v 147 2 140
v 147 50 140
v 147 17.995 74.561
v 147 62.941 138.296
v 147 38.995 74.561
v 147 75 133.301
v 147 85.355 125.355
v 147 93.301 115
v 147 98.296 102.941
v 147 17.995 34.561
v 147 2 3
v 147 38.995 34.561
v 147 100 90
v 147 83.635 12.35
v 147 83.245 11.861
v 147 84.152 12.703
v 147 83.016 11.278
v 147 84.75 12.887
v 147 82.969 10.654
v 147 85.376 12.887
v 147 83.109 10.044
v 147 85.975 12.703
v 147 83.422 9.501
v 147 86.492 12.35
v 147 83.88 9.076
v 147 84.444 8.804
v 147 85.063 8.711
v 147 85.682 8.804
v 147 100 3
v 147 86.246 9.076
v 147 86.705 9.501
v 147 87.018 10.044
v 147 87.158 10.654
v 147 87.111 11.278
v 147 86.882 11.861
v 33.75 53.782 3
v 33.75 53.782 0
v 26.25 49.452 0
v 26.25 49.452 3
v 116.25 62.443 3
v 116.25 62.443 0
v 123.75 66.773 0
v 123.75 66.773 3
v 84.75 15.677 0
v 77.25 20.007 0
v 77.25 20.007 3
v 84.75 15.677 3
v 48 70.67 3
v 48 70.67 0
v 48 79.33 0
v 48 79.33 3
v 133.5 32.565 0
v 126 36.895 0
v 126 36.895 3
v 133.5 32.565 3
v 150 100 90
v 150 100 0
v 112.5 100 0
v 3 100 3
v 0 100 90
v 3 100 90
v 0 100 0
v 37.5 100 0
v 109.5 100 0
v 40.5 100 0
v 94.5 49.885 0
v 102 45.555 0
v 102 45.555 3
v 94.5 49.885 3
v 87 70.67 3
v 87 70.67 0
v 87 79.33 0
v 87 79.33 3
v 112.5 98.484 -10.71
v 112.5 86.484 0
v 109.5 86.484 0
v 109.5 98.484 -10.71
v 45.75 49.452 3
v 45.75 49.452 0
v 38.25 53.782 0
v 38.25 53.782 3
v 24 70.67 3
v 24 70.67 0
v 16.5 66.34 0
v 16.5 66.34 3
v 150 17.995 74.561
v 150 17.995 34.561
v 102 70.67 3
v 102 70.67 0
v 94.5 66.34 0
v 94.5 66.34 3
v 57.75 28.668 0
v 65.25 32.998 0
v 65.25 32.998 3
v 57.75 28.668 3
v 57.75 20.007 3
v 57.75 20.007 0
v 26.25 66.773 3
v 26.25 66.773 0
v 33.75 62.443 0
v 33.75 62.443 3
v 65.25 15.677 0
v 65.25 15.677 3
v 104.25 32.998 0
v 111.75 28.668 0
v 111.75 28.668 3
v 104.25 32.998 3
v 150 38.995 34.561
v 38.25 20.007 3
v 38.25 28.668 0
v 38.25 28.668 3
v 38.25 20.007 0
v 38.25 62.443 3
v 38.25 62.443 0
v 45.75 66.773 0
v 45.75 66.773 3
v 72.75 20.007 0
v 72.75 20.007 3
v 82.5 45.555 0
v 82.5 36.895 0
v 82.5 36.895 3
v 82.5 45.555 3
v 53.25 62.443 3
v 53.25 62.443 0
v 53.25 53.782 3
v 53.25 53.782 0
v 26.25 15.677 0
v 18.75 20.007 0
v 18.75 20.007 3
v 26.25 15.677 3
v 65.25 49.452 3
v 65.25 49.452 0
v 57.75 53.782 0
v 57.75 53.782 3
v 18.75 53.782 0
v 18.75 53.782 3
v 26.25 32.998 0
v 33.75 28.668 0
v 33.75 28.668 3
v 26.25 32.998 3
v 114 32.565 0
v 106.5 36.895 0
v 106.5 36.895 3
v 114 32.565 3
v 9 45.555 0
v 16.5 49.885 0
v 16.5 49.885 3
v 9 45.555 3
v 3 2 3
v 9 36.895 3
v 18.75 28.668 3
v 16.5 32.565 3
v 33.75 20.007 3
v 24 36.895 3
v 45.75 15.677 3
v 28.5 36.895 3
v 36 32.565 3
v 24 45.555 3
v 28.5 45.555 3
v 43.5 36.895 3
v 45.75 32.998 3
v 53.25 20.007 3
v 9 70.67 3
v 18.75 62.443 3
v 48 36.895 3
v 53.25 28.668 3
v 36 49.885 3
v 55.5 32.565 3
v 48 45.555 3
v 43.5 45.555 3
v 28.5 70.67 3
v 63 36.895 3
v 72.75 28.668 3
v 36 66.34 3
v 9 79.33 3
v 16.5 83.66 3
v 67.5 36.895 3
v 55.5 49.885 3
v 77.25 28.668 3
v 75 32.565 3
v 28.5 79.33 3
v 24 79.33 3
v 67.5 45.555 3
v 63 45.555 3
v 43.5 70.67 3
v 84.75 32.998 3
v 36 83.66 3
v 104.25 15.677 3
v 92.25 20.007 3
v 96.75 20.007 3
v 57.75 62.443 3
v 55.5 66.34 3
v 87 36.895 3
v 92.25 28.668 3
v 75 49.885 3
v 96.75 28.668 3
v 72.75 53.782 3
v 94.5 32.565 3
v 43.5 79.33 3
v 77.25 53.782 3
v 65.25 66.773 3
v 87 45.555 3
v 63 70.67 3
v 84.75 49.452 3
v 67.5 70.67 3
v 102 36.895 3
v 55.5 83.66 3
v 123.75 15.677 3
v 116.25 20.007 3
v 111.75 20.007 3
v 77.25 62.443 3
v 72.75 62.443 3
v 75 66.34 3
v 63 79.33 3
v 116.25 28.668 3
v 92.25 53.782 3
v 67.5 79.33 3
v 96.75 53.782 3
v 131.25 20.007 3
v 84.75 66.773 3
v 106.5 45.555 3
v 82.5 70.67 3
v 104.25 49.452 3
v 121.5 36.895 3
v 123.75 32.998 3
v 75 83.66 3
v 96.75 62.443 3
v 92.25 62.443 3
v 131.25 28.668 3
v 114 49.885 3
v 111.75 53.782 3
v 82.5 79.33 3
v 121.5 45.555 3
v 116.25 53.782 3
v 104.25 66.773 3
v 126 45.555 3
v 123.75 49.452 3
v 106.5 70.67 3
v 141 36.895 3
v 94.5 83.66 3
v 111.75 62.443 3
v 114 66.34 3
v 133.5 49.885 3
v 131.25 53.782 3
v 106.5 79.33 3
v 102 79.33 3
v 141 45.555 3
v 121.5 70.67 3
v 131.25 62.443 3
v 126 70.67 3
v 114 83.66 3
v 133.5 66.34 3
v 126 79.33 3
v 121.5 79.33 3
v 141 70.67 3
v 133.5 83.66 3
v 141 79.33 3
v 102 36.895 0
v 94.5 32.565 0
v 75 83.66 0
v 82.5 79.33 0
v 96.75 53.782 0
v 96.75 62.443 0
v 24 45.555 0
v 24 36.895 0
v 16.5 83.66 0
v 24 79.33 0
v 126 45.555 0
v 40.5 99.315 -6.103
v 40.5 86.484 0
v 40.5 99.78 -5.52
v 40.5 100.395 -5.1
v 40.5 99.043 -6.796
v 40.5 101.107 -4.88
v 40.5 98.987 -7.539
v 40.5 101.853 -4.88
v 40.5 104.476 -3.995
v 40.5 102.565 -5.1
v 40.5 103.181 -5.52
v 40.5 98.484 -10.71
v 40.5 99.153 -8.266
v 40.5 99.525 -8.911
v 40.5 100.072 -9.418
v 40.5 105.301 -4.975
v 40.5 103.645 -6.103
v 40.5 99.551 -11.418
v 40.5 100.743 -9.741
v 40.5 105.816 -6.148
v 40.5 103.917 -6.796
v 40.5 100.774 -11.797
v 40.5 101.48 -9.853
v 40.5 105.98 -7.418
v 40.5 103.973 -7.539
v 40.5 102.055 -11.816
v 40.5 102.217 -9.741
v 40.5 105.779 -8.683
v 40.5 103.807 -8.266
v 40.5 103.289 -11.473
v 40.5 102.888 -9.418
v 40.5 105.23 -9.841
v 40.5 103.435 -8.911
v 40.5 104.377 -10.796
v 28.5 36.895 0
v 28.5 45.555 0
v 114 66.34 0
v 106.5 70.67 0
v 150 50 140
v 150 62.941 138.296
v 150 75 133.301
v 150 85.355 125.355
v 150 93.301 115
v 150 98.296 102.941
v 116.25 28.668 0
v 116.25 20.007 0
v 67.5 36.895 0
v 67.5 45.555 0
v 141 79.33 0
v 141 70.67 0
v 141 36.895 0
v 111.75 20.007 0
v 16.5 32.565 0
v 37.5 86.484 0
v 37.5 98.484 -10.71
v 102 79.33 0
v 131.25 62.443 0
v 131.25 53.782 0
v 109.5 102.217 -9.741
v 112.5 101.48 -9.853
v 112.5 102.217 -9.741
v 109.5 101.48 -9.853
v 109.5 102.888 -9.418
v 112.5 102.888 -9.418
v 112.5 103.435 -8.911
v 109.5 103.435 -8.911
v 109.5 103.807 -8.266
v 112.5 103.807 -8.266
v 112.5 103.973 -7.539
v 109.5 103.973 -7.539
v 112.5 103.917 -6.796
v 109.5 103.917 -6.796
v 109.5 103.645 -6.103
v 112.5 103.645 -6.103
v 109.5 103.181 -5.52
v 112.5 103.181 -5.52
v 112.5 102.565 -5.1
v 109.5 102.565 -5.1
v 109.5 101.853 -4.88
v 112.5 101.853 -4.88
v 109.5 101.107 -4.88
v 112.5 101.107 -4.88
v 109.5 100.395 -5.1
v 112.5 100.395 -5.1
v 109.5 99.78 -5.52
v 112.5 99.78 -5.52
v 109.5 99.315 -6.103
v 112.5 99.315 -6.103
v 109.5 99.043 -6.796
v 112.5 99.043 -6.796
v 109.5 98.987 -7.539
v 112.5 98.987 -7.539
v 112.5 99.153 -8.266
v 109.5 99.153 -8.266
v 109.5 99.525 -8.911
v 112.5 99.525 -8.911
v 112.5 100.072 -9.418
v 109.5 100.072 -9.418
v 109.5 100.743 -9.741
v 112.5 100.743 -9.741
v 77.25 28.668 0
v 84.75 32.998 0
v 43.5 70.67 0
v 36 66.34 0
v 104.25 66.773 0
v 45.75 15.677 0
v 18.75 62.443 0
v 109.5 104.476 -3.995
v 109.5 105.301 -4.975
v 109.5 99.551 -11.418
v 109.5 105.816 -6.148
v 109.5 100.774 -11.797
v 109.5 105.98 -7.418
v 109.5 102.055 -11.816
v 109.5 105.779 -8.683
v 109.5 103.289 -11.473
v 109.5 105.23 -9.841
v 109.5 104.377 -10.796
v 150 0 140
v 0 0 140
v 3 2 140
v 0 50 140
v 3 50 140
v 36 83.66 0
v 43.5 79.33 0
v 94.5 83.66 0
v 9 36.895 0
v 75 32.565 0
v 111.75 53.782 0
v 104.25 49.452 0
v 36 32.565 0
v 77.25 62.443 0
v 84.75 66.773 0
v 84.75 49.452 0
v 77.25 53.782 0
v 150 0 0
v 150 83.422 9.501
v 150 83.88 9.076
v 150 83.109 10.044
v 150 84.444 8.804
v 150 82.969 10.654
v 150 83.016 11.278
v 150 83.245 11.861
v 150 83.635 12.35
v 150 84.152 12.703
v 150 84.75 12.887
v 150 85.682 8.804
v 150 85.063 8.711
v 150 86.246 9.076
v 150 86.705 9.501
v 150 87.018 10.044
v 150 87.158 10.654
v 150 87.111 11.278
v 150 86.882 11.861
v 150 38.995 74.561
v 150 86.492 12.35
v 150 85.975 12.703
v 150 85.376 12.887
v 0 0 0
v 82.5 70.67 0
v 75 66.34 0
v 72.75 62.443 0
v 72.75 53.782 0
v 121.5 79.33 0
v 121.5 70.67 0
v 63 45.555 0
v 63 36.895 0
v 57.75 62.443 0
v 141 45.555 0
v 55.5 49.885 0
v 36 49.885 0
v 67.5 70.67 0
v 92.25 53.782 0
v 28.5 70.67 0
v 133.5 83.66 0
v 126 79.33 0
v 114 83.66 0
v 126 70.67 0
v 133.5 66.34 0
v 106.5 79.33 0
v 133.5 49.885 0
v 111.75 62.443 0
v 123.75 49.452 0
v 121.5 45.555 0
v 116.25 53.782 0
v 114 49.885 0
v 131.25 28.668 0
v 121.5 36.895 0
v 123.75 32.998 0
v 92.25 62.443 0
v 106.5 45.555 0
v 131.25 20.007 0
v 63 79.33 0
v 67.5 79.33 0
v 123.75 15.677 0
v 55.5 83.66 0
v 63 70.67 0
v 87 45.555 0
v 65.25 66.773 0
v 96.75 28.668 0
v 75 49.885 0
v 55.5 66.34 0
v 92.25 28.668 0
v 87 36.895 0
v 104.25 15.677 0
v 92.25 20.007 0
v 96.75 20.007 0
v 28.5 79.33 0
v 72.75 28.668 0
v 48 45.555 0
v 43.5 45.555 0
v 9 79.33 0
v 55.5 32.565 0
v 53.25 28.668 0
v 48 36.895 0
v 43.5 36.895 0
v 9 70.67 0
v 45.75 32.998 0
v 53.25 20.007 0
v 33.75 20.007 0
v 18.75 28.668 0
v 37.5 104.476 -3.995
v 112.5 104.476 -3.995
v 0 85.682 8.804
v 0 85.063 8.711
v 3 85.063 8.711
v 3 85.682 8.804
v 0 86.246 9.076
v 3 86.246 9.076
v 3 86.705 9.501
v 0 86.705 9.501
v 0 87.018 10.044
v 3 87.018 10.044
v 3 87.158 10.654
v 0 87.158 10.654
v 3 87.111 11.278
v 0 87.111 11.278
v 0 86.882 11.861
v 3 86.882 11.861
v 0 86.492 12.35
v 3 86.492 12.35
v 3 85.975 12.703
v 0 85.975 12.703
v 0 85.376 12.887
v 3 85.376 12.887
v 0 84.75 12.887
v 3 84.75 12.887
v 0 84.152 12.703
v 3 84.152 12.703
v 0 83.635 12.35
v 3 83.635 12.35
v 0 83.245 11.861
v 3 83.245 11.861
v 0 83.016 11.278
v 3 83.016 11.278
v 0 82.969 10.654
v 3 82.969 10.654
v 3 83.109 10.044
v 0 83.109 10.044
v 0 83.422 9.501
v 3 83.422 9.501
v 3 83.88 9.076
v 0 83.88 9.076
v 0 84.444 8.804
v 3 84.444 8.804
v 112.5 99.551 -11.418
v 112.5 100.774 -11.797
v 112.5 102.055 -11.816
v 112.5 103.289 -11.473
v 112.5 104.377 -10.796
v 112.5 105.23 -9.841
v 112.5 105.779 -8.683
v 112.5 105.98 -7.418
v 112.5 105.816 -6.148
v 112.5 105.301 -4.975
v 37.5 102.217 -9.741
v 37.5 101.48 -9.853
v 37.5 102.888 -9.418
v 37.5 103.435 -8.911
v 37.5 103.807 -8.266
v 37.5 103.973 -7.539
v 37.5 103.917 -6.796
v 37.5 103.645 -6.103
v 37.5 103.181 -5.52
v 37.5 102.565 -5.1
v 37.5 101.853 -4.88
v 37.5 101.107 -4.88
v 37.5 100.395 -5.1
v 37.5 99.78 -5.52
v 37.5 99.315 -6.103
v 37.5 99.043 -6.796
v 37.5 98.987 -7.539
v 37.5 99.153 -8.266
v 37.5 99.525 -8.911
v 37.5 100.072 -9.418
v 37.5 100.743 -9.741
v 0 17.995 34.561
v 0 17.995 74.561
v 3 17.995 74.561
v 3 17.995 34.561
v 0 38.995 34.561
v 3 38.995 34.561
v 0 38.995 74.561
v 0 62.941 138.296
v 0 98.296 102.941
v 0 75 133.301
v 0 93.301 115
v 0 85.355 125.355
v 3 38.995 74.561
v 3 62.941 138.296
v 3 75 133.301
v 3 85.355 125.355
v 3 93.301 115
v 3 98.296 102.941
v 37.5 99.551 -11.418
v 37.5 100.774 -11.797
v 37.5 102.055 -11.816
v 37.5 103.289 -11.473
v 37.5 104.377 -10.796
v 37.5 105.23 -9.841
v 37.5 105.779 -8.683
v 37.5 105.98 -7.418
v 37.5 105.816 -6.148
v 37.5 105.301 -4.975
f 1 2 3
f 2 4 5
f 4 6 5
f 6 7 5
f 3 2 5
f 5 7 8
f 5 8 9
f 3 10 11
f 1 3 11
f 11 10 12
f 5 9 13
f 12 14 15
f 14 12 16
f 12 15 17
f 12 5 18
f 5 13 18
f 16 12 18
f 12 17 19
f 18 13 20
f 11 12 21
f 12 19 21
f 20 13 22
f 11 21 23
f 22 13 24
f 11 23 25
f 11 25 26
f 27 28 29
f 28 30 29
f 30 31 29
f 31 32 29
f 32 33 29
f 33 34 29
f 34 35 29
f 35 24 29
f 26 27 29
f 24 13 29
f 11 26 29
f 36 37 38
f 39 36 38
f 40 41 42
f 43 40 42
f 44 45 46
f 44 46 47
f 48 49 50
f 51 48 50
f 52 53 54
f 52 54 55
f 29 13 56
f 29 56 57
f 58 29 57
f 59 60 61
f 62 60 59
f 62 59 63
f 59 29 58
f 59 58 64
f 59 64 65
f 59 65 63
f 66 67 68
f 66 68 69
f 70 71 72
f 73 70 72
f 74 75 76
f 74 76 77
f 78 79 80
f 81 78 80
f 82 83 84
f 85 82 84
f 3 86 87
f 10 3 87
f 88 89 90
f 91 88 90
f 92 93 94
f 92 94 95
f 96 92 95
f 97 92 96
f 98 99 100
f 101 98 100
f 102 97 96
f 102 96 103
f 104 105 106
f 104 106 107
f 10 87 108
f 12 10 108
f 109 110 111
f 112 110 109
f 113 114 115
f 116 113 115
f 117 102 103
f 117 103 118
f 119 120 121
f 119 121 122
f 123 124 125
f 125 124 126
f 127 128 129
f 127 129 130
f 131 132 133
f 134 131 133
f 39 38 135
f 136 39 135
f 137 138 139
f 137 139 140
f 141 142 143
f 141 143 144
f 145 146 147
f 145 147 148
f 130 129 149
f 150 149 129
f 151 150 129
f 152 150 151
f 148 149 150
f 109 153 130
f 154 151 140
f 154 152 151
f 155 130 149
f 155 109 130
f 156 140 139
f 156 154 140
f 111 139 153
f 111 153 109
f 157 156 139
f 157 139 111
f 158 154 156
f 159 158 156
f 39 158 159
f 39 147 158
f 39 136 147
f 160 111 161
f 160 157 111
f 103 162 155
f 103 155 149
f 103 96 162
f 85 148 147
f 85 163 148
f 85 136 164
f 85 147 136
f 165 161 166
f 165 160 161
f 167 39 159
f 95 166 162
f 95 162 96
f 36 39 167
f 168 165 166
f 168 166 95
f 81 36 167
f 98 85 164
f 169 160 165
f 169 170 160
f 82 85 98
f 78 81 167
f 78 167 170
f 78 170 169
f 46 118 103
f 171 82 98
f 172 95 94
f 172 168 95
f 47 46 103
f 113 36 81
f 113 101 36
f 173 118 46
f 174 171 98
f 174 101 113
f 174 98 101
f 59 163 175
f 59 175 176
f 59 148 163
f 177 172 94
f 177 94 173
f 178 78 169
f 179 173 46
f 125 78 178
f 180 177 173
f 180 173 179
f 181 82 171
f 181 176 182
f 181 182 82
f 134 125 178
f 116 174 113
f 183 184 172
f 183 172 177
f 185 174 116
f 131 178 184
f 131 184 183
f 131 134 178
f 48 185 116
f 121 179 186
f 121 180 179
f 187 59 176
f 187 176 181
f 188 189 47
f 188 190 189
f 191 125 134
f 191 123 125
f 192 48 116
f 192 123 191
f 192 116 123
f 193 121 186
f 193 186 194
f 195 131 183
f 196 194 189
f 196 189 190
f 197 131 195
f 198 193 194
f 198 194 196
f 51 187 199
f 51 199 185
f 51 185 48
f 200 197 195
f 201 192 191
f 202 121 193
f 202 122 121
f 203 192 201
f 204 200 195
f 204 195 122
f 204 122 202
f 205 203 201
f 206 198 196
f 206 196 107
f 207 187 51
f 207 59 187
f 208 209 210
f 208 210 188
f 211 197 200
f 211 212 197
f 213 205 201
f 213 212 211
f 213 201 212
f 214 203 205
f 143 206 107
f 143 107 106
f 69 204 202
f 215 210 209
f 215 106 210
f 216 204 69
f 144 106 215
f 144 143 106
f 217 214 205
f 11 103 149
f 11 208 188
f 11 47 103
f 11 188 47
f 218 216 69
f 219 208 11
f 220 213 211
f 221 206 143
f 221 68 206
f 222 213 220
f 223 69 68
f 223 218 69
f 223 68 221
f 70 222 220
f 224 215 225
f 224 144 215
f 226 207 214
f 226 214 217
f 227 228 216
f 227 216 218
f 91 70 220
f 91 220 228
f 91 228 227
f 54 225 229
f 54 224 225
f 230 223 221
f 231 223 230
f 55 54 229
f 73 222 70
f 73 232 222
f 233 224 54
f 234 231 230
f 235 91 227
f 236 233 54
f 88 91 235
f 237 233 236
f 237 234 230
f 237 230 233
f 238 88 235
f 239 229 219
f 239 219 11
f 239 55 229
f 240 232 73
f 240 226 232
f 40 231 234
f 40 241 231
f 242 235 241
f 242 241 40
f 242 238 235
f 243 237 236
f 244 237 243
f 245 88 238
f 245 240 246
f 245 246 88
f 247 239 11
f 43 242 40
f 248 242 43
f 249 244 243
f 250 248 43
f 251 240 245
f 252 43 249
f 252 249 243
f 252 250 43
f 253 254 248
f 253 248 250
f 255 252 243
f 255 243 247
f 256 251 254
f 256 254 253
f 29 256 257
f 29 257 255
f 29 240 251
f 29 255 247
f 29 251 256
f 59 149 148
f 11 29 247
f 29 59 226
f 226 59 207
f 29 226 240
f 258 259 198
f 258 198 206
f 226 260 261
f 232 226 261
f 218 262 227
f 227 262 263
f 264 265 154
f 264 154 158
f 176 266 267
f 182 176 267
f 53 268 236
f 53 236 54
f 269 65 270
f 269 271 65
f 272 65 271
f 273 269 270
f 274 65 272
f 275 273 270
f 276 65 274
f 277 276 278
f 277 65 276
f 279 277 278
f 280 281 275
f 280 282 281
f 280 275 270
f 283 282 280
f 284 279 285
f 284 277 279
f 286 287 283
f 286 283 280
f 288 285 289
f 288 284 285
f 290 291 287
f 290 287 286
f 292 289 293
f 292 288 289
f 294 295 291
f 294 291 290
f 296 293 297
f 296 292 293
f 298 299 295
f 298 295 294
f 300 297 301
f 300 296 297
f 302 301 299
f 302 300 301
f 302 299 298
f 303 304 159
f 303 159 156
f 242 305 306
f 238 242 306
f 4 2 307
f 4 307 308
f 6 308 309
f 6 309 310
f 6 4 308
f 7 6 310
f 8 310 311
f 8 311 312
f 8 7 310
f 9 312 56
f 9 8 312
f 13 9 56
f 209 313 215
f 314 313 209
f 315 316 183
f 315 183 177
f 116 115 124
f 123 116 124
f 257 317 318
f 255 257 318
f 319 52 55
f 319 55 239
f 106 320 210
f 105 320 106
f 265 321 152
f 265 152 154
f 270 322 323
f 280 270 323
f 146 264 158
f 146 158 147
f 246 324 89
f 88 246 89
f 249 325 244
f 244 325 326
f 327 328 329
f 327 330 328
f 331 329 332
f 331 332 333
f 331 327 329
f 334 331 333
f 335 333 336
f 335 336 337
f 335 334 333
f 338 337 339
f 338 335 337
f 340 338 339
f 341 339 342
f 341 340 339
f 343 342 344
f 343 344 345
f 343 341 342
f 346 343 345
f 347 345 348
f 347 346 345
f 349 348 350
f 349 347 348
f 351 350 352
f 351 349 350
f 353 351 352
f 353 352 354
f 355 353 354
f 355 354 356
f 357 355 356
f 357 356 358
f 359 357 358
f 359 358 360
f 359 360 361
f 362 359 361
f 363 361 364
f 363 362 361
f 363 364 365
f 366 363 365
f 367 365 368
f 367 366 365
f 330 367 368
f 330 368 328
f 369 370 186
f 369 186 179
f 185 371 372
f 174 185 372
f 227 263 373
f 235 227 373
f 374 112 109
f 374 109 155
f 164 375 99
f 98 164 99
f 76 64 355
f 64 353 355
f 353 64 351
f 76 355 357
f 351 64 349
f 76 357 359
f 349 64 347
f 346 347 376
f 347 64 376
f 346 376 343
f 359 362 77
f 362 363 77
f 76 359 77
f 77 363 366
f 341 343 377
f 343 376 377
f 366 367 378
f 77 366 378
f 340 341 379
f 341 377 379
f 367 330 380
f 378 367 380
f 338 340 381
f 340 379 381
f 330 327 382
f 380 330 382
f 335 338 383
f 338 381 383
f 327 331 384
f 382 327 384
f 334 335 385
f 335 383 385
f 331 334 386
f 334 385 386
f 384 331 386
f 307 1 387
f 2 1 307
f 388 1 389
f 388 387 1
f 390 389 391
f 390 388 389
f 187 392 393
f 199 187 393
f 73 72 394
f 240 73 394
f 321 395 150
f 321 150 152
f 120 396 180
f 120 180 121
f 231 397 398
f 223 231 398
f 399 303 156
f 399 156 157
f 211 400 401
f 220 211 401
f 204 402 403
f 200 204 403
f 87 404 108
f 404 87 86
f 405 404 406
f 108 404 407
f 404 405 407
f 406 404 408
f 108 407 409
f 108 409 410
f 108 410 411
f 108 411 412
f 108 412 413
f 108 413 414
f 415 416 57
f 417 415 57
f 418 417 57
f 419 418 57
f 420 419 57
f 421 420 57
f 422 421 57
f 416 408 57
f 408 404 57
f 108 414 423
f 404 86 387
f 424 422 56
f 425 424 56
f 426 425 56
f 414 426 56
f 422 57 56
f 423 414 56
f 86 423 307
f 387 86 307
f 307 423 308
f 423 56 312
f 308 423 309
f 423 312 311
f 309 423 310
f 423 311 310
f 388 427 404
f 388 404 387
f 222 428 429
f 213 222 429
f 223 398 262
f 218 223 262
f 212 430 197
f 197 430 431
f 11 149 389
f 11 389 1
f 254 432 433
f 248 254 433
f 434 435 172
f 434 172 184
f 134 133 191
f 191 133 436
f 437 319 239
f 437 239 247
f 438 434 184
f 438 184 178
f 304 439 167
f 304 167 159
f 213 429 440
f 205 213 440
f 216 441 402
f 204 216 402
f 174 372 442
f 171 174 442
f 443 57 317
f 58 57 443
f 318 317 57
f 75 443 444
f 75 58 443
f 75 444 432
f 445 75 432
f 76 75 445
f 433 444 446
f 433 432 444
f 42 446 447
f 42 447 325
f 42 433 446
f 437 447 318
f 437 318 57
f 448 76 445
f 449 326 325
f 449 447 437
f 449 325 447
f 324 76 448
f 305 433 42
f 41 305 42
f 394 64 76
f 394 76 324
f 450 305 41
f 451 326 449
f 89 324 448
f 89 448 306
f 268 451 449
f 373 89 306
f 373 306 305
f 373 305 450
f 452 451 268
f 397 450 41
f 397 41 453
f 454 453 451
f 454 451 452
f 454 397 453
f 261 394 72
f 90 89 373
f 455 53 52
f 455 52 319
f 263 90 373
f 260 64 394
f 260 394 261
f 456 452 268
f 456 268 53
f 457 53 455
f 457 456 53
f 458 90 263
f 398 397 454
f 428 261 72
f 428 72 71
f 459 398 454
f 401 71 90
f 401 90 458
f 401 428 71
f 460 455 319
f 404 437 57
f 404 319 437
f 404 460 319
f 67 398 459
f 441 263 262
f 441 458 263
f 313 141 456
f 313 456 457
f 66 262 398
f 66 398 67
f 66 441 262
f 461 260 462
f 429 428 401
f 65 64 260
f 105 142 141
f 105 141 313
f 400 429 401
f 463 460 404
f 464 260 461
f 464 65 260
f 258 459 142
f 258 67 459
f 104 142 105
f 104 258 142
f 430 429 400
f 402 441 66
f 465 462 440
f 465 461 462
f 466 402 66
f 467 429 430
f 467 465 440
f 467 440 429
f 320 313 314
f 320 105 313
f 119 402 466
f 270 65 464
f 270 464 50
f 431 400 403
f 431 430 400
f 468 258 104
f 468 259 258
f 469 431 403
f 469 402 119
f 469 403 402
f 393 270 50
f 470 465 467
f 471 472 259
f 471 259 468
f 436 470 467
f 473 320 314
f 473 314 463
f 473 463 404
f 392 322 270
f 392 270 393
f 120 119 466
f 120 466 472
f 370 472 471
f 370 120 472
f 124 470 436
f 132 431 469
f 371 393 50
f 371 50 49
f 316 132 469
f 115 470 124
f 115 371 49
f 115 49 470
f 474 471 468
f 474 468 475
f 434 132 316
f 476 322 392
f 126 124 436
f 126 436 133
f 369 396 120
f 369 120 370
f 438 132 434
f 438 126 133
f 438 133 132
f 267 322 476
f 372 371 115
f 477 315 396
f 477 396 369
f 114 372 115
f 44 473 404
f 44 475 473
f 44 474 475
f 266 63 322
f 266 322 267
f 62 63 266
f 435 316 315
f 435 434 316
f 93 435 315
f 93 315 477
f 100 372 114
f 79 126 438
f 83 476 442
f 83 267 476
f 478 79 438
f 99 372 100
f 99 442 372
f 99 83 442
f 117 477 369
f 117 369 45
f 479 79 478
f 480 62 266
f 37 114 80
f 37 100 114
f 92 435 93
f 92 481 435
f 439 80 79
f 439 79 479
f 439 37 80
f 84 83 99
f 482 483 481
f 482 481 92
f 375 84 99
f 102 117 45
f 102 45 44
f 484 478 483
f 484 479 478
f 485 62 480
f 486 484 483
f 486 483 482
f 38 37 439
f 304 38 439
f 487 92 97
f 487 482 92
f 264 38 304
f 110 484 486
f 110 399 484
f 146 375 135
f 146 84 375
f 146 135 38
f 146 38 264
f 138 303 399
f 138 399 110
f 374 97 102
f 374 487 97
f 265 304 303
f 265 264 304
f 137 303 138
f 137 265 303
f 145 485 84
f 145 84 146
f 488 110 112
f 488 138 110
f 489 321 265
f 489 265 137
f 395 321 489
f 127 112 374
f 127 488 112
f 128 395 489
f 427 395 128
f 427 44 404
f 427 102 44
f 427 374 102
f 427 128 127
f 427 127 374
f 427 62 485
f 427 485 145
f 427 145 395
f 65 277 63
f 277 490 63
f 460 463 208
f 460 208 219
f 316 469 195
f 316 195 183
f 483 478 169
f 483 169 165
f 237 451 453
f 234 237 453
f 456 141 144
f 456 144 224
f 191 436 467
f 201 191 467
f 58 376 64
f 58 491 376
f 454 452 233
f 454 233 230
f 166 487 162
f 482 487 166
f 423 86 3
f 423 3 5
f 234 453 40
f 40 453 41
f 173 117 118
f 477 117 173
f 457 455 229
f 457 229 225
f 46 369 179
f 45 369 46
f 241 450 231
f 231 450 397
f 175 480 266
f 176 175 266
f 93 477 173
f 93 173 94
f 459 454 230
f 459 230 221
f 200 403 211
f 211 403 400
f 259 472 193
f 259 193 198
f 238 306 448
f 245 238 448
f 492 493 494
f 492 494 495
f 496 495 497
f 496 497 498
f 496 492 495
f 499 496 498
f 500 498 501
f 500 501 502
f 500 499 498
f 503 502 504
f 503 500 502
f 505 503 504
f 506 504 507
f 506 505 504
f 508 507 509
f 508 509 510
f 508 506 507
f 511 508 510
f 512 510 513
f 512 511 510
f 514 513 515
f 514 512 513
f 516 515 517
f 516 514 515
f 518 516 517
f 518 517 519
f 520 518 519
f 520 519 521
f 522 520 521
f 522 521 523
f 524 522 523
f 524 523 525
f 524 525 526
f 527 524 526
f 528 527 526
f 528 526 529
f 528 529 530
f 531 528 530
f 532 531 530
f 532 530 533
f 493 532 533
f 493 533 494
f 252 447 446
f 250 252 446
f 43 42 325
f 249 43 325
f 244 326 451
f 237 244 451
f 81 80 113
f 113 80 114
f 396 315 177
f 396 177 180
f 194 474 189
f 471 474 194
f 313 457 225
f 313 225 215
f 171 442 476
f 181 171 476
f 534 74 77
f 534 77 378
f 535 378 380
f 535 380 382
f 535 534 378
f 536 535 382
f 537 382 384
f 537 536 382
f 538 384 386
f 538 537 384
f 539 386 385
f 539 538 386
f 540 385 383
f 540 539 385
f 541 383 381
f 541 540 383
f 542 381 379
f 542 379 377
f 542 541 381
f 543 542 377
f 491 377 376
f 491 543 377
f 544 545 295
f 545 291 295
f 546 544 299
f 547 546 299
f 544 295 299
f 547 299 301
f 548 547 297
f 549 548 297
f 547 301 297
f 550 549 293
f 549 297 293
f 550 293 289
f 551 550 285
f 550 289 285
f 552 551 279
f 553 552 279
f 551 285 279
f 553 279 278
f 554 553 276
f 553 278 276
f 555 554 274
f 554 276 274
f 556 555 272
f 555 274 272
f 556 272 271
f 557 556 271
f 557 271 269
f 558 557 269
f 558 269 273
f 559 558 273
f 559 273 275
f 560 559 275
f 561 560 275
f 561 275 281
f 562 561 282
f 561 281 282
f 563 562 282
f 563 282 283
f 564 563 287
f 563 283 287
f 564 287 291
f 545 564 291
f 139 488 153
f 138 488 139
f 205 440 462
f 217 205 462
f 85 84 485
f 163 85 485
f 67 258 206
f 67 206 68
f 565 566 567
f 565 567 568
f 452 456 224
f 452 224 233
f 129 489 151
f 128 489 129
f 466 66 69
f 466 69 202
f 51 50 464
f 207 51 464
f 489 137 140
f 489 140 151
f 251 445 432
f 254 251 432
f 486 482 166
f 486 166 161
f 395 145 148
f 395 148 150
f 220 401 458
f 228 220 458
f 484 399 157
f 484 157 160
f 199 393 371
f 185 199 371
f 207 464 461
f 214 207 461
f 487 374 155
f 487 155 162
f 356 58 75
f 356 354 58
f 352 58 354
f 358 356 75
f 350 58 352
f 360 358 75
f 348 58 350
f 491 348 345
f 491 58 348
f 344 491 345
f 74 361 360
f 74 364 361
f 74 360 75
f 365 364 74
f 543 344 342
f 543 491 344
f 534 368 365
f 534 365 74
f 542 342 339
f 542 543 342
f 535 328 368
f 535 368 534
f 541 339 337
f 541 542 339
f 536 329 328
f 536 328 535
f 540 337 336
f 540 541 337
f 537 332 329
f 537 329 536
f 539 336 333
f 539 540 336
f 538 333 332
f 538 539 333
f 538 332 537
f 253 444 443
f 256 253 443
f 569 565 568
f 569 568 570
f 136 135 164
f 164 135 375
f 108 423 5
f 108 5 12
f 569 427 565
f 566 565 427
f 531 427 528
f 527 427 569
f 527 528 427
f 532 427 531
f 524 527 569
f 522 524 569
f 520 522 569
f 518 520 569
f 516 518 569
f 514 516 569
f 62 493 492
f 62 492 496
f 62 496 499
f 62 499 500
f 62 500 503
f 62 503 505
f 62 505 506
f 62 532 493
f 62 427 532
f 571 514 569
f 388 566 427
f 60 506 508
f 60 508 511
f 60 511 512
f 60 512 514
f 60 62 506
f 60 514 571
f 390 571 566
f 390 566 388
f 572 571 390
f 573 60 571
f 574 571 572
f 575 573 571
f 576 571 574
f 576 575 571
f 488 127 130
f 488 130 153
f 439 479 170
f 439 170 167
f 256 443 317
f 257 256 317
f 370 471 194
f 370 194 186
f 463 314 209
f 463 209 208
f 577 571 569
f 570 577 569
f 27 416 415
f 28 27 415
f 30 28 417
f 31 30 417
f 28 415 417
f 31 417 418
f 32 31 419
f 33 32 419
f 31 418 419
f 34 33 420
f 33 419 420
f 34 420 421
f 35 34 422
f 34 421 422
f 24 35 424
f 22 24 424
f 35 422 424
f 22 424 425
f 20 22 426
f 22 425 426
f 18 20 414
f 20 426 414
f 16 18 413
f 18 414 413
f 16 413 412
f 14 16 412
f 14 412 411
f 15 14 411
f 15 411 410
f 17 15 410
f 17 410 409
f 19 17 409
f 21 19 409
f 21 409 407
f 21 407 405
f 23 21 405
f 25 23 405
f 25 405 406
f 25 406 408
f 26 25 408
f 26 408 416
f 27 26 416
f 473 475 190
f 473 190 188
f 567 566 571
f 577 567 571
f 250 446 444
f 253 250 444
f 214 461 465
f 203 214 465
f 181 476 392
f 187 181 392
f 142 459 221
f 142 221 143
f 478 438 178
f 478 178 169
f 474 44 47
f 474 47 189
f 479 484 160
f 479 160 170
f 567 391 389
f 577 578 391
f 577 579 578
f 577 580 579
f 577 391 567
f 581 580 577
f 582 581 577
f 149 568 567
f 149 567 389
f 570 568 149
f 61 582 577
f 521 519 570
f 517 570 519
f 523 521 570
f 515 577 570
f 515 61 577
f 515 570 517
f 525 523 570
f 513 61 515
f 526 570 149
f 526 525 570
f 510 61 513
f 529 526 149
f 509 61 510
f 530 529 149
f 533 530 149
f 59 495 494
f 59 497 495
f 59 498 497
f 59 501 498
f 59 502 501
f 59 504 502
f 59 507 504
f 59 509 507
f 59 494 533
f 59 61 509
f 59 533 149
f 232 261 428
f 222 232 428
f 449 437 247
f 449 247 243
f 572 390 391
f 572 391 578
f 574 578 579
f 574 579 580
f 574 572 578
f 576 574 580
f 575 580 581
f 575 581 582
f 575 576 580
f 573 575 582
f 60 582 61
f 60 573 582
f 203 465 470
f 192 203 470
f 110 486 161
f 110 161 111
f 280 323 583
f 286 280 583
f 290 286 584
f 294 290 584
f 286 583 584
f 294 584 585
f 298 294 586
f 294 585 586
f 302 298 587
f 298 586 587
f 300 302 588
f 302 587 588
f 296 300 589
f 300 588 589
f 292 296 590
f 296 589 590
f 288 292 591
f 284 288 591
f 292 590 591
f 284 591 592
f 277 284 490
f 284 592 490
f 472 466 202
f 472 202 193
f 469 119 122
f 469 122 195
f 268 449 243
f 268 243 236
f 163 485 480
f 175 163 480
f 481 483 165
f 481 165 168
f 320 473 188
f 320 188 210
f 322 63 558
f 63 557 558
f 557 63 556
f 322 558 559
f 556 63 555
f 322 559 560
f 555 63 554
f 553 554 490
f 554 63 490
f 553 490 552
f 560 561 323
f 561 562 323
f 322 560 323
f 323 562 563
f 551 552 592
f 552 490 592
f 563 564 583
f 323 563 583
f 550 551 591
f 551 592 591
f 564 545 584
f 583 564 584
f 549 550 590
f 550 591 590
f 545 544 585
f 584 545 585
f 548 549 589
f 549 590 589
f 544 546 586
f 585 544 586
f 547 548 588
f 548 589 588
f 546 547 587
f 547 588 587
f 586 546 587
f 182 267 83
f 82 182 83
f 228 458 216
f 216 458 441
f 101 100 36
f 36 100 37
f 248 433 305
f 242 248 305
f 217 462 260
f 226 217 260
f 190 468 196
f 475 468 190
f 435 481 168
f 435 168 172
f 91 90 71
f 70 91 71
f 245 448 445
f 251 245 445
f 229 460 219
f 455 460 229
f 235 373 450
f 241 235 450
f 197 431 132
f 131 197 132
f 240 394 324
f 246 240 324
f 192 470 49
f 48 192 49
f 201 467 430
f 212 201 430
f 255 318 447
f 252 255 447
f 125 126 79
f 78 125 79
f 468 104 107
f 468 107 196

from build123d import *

# Parameters (mm, degrees)
BOSS_EXTRUDE1_DEPTH = 150
SKETCH2_W           = 144
SKETCH2_H           = 142
CUT_EXTRUDE1_DEPTH  = 98
SKETCH3_R           = 2.5
BOSS_EXTRUDE2_DEPTH = 1.5
CUT_EXTRUDE2_REACH  = 232.937
SKETCH4_R           = 2.1
SKETCH4_W           = 40
SKETCH4_H           = 21
CUT_EXTRUDE3_DEPTH  = 10


with BuildPart() as part:
    # Sketch1 → Boss-Extrude1 (new body)
    with BuildSketch(Plane(origin=(0, 0, 0), x_dir=(0, 0, -1), z_dir=(1, 0, 0))):
        with BuildLine():
            Line((0, 0), (-140, 0))
            Line((-140, 0), (-140, 50))
            ThreePointArc((-140, 50), (-125.355339059, 85.355339059), (-90, 100))
            Line((-90, 100), (0, 100))
            Line((0, 100), (0, 0))
        make_face()
    extrude(amount=BOSS_EXTRUDE1_DEPTH)

    # Sketch2 → Cut-Extrude1 (cut)
    with BuildSketch(Plane(origin=(0, 100, 0), x_dir=(1, 0, 0), z_dir=(0, 1, 0))):
        with Locations((75, -74)):
            Rectangle(SKETCH2_W, SKETCH2_H)
    extrude(amount=-CUT_EXTRUDE1_DEPTH, mode=Mode.SUBTRACT)

    # Sketch3 → Boss-Extrude2 (add, symmetric)
    with BuildSketch(Plane(origin=(111, 0, 0), x_dir=(0, 0, -1), z_dir=(1, 0, 0))):
        with BuildLine():
            Line((0, 100), (0, 86.483689179))
            Line((0, 86.483689179), (10.709846007, 98.483689179))
            ThreePointArc((10.709846007, 98.483689179), (10.348889249, 104.837405432), (3.995172996, 104.476448674))
            Line((3.995172996, 104.476448674), (0, 100))
        make_face()
        with Locations((7.352509502, 101.480068927)):
            Circle(SKETCH3_R, mode=Mode.SUBTRACT)
    boss_extrude2 = extrude(amount=BOSS_EXTRUDE2_DEPTH, both=True)

    # Mirror1: Boss-Extrude2 across plane
    add(boss_extrude2.mirror(Plane(origin=(75, 0, 0), x_dir=(0, 0, 1), z_dir=(1, 0, 0))))

    # Sketch4 → Cut-Extrude2 (cut, up to next)
    with BuildSketch(Plane(origin=(150, 0, 0), x_dir=(0, 0, -1), z_dir=(1, 0, 0)), mode=Mode.PRIVATE) as cut_extrude2_sk1:
        with Locations((-10.810728321, 85.063406284)):
            Circle(SKETCH4_R)
    cut_extrude2_tool1 = extrude(cut_extrude2_sk1.sketch, amount=-CUT_EXTRUDE2_REACH, mode=Mode.PRIVATE) & part.part
    # Sketch4 → Cut-Extrude2 (cut, up to next)
    with BuildSketch(Plane(origin=(150, 0, 0), x_dir=(0, 0, -1), z_dir=(1, 0, 0)), mode=Mode.PRIVATE) as cut_extrude2_sk2:
        with Locations((-54.561214212, 28.49486379)):
            Rectangle(SKETCH4_W, SKETCH4_H)
    cut_extrude2_tool2 = extrude(cut_extrude2_sk2.sketch, amount=-CUT_EXTRUDE2_REACH, mode=Mode.PRIVATE) & part.part
    cut_extrude2_1 = cut_extrude2_tool1.solids().sort_by_distance((150, 85.063406, 10.810728))[0]
    add(cut_extrude2_1, mode=Mode.SUBTRACT)
    cut_extrude2_2 = cut_extrude2_tool2.solids().sort_by_distance((150, 28.494864, 54.561214))[0]
    add(cut_extrude2_2, mode=Mode.SUBTRACT)
    cut_extrude2 = cut_extrude2_1 + cut_extrude2_2  # Cut-Extrude2 as one shape, for the pattern or mirror that repeats it

    # Mirror2: Cut-Extrude2 across plane
    add(cut_extrude2.mirror(Plane(origin=(75, 0, 0), x_dir=(0, 0, 1), z_dir=(1, 0, 0))), mode=Mode.SUBTRACT)

    # Sketch5 → Cut-Extrude3 (cut)
    with BuildSketch(Plane(origin=(0, 0, 0), x_dir=(-1, 0, 0), z_dir=(0, 0, -1))):
        Polygon((-114, 83.660254038), (-121.5, 79.330127019), (-121.5, 70.669872981), (-114, 66.339745962), (-106.5, 70.669872981), (-106.5, 79.330127019), align=None)
        Polygon((-133.5, 83.660254038), (-141, 79.330127019), (-141, 70.669872981), (-133.5, 66.339745962), (-126, 70.669872981), (-126, 79.330127019), align=None)
        Polygon((-94.5, 83.660254038), (-102, 79.330127019), (-102, 70.669872981), (-94.5, 66.339745962), (-87, 70.669872981), (-87, 79.330127019), align=None)
        Polygon((-75, 83.660254038), (-82.5, 79.330127019), (-82.5, 70.669872981), (-75, 66.339745962), (-67.5, 70.669872981), (-67.5, 79.330127019), align=None)
        Polygon((-55.5, 83.660254038), (-63, 79.330127019), (-63, 70.669872981), (-55.5, 66.339745962), (-48, 70.669872981), (-48, 79.330127019), align=None)
        Polygon((-36, 83.660254038), (-43.5, 79.330127019), (-43.5, 70.669872981), (-36, 66.339745962), (-28.5, 70.669872981), (-28.5, 79.330127019), align=None)
        Polygon((-16.5, 83.660254038), (-24, 79.330127019), (-24, 70.669872981), (-16.5, 66.339745962), (-9, 70.669872981), (-9, 79.330127019), align=None)
        Polygon((-123.75, 66.772758664), (-131.25, 62.442631645), (-131.25, 53.782377607), (-123.75, 49.452250588), (-116.25, 53.782377607), (-116.25, 62.442631645), align=None)
        Polygon((-104.25, 66.772758664), (-111.75, 62.442631645), (-111.75, 53.782377607), (-104.25, 49.452250588), (-96.75, 53.782377607), (-96.75, 62.442631645), align=None)
        Polygon((-84.75, 66.772758664), (-92.25, 62.442631645), (-92.25, 53.782377607), (-84.75, 49.452250588), (-77.25, 53.782377607), (-77.25, 62.442631645), align=None)
        Polygon((-65.25, 66.772758664), (-72.75, 62.442631645), (-72.75, 53.782377607), (-65.25, 49.452250588), (-57.75, 53.782377607), (-57.75, 62.442631645), align=None)
        Polygon((-45.75, 66.772758664), (-53.25, 62.442631645), (-53.25, 53.782377607), (-45.75, 49.452250588), (-38.25, 53.782377607), (-38.25, 62.442631645), align=None)
        Polygon((-26.25, 66.772758664), (-33.75, 62.442631645), (-33.75, 53.782377607), (-26.25, 49.452250588), (-18.75, 53.782377607), (-18.75, 62.442631645), align=None)
        Polygon((-9, 36.894882233), (-16.5, 32.564755215), (-24, 36.894882233), (-24, 45.555136271), (-16.5, 49.88526329), (-9, 45.555136271), align=None)
        Polygon((-28.5, 36.894882233), (-36, 32.564755215), (-43.5, 36.894882233), (-43.5, 45.555136271), (-36, 49.88526329), (-28.5, 45.555136271), align=None)
        Polygon((-48, 36.894882233), (-55.5, 32.564755215), (-63, 36.894882233), (-63, 45.555136271), (-55.5, 49.88526329), (-48, 45.555136271), align=None)
        Polygon((-67.5, 36.894882233), (-75, 32.564755215), (-82.5, 36.894882233), (-82.5, 45.555136271), (-75, 49.88526329), (-67.5, 45.555136271), align=None)
        Polygon((-87, 36.894882233), (-94.5, 32.564755215), (-102, 36.894882233), (-102, 45.555136271), (-94.5, 49.88526329), (-87, 45.555136271), align=None)
        Polygon((-106.5, 36.894882233), (-114, 32.564755215), (-121.5, 36.894882233), (-121.5, 45.555136271), (-114, 49.88526329), (-106.5, 45.555136271), align=None)
        Polygon((-126, 36.894882233), (-133.5, 32.564755215), (-141, 36.894882233), (-141, 45.555136271), (-133.5, 49.88526329), (-126, 45.555136271), align=None)
        Polygon((-18.75, 20.00738686), (-26.25, 15.677259841), (-33.75, 20.00738686), (-33.75, 28.667640898), (-26.25, 32.997767916), (-18.75, 28.667640898), align=None)
        Polygon((-38.25, 20.00738686), (-45.75, 15.677259841), (-53.25, 20.00738686), (-53.25, 28.667640898), (-45.75, 32.997767916), (-38.25, 28.667640898), align=None)
        Polygon((-57.75, 20.00738686), (-65.25, 15.677259841), (-72.75, 20.00738686), (-72.75, 28.667640898), (-65.25, 32.997767916), (-57.75, 28.667640898), align=None)
        Polygon((-77.25, 20.00738686), (-84.75, 15.677259841), (-92.25, 20.00738686), (-92.25, 28.667640898), (-84.75, 32.997767916), (-77.25, 28.667640898), align=None)
        Polygon((-96.75, 20.00738686), (-104.25, 15.677259841), (-111.75, 20.00738686), (-111.75, 28.667640898), (-104.25, 32.997767916), (-96.75, 28.667640898), align=None)
        Polygon((-116.25, 20.00738686), (-123.75, 15.677259841), (-131.25, 20.00738686), (-131.25, 28.667640898), (-123.75, 32.997767916), (-116.25, 28.667640898), align=None)
    extrude(amount=-CUT_EXTRUDE3_DEPTH, mode=Mode.SUBTRACT)


solid = part.part
